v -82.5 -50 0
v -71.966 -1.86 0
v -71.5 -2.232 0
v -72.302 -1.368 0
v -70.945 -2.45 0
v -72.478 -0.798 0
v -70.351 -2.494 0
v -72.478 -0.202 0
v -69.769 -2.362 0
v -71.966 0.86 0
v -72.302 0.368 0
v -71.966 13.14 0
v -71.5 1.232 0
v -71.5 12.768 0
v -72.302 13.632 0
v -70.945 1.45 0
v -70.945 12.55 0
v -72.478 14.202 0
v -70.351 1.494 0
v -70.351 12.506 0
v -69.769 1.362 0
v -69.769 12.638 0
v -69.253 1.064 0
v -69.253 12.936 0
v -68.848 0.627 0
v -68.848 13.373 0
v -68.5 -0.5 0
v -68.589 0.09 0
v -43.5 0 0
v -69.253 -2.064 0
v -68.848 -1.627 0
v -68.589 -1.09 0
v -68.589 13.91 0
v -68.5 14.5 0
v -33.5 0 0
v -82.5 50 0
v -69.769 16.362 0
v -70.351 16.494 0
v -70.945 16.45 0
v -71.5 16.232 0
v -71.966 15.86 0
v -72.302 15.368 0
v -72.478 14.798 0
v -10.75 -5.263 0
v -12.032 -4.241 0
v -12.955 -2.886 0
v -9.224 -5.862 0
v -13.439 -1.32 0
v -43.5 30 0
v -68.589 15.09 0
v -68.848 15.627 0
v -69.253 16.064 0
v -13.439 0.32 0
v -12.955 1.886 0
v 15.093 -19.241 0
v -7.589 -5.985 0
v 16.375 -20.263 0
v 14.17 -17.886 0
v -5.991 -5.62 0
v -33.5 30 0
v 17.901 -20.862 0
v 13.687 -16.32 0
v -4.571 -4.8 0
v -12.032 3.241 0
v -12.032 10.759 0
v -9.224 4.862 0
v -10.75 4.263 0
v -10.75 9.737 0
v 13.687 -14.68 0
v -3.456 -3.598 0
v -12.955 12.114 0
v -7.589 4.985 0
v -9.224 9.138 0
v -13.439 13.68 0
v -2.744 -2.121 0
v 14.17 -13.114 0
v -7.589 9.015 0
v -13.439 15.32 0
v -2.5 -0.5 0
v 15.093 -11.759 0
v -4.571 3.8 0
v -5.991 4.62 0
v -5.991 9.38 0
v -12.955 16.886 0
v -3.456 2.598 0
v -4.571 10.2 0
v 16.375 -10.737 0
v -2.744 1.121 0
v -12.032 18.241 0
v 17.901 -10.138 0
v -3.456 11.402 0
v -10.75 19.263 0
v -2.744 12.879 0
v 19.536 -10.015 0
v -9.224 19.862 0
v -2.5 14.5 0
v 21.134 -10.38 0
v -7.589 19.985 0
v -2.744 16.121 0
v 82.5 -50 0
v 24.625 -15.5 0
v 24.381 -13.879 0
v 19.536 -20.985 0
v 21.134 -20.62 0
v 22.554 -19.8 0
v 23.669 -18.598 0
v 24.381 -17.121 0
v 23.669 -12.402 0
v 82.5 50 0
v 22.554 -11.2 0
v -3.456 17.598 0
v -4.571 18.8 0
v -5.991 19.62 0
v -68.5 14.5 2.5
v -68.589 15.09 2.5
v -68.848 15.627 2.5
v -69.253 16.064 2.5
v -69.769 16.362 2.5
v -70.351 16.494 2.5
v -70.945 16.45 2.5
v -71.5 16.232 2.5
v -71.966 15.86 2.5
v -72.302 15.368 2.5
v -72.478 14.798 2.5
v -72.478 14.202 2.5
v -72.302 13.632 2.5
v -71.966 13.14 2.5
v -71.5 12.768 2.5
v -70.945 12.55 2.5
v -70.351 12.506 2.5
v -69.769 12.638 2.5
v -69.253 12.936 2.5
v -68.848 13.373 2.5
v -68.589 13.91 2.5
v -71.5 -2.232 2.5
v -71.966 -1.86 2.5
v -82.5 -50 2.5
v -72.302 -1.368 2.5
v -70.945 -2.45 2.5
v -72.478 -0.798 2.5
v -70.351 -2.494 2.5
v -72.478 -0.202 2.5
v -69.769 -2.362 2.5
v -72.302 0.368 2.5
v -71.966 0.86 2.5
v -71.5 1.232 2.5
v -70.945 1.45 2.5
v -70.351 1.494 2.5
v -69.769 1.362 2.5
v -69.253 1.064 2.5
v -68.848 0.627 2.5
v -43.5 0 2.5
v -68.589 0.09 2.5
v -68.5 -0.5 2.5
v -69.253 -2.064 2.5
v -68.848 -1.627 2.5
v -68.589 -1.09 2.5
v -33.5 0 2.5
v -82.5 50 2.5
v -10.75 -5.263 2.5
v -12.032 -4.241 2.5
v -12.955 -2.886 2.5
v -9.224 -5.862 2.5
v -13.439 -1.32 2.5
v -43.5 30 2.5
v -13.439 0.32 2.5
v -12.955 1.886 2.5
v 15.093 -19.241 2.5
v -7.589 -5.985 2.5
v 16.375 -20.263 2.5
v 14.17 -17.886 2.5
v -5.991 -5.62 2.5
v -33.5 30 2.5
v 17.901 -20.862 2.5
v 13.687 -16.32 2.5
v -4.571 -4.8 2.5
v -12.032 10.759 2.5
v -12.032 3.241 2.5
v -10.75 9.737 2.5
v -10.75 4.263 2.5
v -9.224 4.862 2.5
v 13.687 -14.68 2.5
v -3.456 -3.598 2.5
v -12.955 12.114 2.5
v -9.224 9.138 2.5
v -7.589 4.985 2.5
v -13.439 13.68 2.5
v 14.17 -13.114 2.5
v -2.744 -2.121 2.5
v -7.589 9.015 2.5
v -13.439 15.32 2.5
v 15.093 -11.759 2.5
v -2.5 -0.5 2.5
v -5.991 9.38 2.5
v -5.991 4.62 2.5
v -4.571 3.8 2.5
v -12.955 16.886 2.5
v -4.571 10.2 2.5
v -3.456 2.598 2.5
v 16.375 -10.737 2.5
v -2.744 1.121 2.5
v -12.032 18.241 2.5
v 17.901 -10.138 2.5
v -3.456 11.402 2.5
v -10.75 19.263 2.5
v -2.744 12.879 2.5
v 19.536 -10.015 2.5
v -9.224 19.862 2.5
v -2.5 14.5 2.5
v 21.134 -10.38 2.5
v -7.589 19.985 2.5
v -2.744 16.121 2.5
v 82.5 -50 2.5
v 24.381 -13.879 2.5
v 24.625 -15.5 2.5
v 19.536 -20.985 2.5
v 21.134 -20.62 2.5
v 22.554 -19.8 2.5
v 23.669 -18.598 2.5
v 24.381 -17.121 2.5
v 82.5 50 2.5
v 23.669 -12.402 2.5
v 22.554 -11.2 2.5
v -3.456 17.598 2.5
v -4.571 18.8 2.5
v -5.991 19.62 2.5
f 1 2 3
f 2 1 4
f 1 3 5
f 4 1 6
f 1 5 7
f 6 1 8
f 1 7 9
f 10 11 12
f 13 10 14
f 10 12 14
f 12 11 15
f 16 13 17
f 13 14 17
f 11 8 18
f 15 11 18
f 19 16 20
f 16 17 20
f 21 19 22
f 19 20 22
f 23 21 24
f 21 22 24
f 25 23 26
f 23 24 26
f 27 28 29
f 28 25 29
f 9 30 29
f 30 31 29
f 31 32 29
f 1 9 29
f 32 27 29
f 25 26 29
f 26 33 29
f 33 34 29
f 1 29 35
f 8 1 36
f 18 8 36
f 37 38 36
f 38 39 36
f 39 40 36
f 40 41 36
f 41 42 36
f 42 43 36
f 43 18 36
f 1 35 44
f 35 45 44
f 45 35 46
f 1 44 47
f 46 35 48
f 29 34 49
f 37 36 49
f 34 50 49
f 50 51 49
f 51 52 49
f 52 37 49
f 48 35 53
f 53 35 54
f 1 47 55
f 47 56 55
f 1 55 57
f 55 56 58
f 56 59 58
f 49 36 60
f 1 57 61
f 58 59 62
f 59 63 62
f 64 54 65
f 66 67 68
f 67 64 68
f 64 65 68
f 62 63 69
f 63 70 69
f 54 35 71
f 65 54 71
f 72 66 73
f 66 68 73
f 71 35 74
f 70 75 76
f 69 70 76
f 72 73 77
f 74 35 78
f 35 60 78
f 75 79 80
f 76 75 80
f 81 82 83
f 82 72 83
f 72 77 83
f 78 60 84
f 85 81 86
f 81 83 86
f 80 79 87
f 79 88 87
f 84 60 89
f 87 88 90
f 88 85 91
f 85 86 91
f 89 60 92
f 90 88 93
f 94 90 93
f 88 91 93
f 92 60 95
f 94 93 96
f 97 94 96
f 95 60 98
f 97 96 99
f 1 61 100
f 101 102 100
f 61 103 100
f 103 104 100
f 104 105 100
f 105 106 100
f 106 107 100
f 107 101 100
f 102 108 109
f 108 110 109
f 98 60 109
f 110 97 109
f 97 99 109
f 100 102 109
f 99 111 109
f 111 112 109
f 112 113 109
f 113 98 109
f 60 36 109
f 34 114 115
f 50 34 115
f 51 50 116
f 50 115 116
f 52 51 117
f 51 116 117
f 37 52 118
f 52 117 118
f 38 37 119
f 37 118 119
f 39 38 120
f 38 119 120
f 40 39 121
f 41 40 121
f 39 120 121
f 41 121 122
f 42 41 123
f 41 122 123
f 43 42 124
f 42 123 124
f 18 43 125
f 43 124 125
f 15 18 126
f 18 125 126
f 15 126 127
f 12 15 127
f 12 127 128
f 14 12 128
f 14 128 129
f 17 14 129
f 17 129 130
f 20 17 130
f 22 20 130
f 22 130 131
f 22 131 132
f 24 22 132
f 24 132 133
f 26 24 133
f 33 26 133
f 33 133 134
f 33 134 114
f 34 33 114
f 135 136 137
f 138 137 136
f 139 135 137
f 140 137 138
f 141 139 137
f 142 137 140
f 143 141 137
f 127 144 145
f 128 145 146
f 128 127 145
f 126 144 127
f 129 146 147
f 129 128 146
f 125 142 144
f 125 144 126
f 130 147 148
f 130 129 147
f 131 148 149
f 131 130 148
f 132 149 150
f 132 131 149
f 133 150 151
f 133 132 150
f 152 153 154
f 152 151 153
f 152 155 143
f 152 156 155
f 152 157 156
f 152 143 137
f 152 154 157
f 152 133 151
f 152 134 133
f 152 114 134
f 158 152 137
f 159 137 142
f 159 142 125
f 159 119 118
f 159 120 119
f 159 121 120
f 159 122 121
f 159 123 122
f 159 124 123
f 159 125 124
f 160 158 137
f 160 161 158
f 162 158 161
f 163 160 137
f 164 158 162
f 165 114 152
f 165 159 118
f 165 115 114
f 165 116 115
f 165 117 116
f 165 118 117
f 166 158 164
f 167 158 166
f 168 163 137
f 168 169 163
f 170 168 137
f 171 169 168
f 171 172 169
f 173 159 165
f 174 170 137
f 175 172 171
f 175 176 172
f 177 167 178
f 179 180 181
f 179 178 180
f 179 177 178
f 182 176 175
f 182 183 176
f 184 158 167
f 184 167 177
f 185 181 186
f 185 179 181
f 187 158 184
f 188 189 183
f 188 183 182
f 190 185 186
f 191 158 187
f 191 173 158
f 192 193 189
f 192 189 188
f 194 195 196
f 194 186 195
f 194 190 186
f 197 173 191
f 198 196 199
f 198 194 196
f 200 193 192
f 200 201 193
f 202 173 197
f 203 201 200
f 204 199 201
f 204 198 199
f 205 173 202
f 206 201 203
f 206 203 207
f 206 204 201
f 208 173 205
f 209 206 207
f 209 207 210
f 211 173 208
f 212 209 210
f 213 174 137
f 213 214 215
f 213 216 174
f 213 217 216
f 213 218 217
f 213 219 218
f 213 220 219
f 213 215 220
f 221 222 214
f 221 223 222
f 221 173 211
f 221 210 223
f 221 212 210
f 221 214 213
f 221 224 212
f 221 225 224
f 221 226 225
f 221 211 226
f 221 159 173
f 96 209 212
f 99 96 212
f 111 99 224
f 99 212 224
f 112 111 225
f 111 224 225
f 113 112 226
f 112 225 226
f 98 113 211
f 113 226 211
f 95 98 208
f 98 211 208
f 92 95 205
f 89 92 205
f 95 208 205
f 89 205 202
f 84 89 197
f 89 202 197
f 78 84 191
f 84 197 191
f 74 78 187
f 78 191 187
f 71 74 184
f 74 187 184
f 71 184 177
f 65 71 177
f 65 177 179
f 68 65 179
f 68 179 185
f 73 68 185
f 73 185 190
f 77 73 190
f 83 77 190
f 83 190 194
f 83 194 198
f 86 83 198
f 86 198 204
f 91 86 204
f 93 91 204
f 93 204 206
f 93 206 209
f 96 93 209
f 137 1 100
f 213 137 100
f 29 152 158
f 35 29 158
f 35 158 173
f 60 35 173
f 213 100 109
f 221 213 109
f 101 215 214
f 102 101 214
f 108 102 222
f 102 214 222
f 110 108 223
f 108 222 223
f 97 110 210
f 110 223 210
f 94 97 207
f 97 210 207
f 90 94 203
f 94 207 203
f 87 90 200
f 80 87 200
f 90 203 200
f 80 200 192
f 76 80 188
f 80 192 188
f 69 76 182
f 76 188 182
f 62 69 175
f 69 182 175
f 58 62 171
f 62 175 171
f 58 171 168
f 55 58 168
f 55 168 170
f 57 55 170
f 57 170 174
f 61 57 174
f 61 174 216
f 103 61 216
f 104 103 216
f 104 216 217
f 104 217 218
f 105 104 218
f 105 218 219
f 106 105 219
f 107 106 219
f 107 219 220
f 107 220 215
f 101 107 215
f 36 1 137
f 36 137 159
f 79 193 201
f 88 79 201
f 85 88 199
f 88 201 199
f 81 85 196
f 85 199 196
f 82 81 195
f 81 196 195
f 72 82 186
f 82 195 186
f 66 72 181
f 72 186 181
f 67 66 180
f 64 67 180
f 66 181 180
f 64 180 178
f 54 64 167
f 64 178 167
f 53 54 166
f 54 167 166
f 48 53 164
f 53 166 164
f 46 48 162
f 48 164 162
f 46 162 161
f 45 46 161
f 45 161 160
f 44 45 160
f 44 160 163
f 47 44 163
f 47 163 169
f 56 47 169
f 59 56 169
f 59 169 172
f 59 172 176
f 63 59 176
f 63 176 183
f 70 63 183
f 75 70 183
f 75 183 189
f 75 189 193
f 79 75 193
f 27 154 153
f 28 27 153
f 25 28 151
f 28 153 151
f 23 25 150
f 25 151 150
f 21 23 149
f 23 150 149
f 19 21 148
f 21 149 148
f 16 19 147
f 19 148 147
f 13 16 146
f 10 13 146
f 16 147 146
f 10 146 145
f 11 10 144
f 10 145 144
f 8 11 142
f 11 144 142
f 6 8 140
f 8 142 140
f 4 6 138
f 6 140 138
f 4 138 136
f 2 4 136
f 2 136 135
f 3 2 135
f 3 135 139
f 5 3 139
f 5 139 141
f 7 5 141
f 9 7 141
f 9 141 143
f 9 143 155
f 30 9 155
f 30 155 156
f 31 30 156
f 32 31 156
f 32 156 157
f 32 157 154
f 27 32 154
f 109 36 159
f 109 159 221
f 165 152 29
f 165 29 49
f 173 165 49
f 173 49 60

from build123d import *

# Parameters (mm, degrees)
F0_W     = 165
F0_H     = 100
F1_DEPTH = 2.5
F2_R     = 5.5
F2_W     = 10
F2_H     = 30
F2_R_2   = 2
F3_DEPTH = 25


with BuildPart() as f1:
    # F0 (on Top) → F1 (new body)
    with BuildSketch(Plane.XY):
        Rectangle(F0_W, F0_H)
    extrude(amount=F1_DEPTH)

    # F2 (on face) → F3 (cut)
    with BuildSketch(Plane.XY.offset(2.5)):
        with Locations((-8, 14.5)):
            Circle(F2_R)
        with Locations((-8, -0.5)):
            Circle(F2_R)
        with Locations((19.125108, -15.5)):
            Circle(F2_R)
        with Locations((-38.5, 15)):
            Rectangle(F2_W, F2_H)
        with Locations((-70.5, 14.5)):
            Circle(F2_R_2)
        with Locations((-70.5, -0.5)):
            Circle(F2_R_2)
    extrude(amount=-F3_DEPTH, mode=Mode.SUBTRACT)


solid = f1.part
